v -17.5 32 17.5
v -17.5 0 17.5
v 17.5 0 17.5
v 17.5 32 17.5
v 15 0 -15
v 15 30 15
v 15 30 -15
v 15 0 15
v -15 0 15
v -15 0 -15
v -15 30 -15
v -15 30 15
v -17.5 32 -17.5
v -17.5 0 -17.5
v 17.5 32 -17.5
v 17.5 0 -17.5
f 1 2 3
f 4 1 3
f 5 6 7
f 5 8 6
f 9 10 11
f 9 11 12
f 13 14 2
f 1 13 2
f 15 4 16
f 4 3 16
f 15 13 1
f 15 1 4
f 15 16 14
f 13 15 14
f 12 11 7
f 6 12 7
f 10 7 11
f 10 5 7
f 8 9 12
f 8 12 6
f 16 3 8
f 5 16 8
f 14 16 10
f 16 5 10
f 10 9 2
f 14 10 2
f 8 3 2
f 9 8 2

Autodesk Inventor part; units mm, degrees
ref_plane "YZ Plane" through (0, 0, 0) normal (1, 0, 0) x (0, 1, 0)
ref_plane "XZ Plane" through (0, 0, 0) normal (0, 1, 0) x (-1, 0, 0)
ref_plane "XY Plane" through (0, 0, 0) normal (0, 0, 1) x (1, 0, 0)
sketch "Sketch1" plane through (0, 0, 0) normal (0, 1, 0) x (-1, 0, 0)
  line L0 (0, -24.5) -> (0, 24.5) construction
  line L1 (-24.5, 0) -> (24.5, 0) construction
  line L2 (17.5, 17.5) -> (-17.5, 17.5)
  line L3 (-17.5, 17.5) -> (-17.5, -17.5)
  line L4 (-17.5, -17.5) -> (17.5, -17.5)
  line L5 (17.5, -17.5) -> (17.5, 17.5)
  line L6 (15, 15) -> (-15, 15)
  line L7 (-15, 15) -> (-15, -15)
  line L8 (-15, -15) -> (15, -15)
  line L9 (15, -15) -> (15, 15)
  point P0 (0, 0)
  dimension "d0" = 35
  dimension "d1" = 35
  dimension "d2" = 30
  dimension "d3" = 30
extrude "Extrusion1" add sketch "Sketch1" along normal blind 30
sketch "Sketch2" plane through (0, 30, 0) normal (0, 1, 0) x (1, 0, 0)
  line L0 (-17.5, 17.5) -> (-17.5, -17.5) projected
  line L1 (-17.5, -17.5) -> (17.5, -17.5) projected
  line L2 (17.5, -17.5) -> (17.5, 17.5) projected
  line L3 (17.5, 17.5) -> (-17.5, 17.5) projected
  point P0 (0, 0)
extrude "Extrusion2" add sketch "Sketch2" along normal blind 2
properties part number "UG-752-30x30x32mm" material "Glass"
